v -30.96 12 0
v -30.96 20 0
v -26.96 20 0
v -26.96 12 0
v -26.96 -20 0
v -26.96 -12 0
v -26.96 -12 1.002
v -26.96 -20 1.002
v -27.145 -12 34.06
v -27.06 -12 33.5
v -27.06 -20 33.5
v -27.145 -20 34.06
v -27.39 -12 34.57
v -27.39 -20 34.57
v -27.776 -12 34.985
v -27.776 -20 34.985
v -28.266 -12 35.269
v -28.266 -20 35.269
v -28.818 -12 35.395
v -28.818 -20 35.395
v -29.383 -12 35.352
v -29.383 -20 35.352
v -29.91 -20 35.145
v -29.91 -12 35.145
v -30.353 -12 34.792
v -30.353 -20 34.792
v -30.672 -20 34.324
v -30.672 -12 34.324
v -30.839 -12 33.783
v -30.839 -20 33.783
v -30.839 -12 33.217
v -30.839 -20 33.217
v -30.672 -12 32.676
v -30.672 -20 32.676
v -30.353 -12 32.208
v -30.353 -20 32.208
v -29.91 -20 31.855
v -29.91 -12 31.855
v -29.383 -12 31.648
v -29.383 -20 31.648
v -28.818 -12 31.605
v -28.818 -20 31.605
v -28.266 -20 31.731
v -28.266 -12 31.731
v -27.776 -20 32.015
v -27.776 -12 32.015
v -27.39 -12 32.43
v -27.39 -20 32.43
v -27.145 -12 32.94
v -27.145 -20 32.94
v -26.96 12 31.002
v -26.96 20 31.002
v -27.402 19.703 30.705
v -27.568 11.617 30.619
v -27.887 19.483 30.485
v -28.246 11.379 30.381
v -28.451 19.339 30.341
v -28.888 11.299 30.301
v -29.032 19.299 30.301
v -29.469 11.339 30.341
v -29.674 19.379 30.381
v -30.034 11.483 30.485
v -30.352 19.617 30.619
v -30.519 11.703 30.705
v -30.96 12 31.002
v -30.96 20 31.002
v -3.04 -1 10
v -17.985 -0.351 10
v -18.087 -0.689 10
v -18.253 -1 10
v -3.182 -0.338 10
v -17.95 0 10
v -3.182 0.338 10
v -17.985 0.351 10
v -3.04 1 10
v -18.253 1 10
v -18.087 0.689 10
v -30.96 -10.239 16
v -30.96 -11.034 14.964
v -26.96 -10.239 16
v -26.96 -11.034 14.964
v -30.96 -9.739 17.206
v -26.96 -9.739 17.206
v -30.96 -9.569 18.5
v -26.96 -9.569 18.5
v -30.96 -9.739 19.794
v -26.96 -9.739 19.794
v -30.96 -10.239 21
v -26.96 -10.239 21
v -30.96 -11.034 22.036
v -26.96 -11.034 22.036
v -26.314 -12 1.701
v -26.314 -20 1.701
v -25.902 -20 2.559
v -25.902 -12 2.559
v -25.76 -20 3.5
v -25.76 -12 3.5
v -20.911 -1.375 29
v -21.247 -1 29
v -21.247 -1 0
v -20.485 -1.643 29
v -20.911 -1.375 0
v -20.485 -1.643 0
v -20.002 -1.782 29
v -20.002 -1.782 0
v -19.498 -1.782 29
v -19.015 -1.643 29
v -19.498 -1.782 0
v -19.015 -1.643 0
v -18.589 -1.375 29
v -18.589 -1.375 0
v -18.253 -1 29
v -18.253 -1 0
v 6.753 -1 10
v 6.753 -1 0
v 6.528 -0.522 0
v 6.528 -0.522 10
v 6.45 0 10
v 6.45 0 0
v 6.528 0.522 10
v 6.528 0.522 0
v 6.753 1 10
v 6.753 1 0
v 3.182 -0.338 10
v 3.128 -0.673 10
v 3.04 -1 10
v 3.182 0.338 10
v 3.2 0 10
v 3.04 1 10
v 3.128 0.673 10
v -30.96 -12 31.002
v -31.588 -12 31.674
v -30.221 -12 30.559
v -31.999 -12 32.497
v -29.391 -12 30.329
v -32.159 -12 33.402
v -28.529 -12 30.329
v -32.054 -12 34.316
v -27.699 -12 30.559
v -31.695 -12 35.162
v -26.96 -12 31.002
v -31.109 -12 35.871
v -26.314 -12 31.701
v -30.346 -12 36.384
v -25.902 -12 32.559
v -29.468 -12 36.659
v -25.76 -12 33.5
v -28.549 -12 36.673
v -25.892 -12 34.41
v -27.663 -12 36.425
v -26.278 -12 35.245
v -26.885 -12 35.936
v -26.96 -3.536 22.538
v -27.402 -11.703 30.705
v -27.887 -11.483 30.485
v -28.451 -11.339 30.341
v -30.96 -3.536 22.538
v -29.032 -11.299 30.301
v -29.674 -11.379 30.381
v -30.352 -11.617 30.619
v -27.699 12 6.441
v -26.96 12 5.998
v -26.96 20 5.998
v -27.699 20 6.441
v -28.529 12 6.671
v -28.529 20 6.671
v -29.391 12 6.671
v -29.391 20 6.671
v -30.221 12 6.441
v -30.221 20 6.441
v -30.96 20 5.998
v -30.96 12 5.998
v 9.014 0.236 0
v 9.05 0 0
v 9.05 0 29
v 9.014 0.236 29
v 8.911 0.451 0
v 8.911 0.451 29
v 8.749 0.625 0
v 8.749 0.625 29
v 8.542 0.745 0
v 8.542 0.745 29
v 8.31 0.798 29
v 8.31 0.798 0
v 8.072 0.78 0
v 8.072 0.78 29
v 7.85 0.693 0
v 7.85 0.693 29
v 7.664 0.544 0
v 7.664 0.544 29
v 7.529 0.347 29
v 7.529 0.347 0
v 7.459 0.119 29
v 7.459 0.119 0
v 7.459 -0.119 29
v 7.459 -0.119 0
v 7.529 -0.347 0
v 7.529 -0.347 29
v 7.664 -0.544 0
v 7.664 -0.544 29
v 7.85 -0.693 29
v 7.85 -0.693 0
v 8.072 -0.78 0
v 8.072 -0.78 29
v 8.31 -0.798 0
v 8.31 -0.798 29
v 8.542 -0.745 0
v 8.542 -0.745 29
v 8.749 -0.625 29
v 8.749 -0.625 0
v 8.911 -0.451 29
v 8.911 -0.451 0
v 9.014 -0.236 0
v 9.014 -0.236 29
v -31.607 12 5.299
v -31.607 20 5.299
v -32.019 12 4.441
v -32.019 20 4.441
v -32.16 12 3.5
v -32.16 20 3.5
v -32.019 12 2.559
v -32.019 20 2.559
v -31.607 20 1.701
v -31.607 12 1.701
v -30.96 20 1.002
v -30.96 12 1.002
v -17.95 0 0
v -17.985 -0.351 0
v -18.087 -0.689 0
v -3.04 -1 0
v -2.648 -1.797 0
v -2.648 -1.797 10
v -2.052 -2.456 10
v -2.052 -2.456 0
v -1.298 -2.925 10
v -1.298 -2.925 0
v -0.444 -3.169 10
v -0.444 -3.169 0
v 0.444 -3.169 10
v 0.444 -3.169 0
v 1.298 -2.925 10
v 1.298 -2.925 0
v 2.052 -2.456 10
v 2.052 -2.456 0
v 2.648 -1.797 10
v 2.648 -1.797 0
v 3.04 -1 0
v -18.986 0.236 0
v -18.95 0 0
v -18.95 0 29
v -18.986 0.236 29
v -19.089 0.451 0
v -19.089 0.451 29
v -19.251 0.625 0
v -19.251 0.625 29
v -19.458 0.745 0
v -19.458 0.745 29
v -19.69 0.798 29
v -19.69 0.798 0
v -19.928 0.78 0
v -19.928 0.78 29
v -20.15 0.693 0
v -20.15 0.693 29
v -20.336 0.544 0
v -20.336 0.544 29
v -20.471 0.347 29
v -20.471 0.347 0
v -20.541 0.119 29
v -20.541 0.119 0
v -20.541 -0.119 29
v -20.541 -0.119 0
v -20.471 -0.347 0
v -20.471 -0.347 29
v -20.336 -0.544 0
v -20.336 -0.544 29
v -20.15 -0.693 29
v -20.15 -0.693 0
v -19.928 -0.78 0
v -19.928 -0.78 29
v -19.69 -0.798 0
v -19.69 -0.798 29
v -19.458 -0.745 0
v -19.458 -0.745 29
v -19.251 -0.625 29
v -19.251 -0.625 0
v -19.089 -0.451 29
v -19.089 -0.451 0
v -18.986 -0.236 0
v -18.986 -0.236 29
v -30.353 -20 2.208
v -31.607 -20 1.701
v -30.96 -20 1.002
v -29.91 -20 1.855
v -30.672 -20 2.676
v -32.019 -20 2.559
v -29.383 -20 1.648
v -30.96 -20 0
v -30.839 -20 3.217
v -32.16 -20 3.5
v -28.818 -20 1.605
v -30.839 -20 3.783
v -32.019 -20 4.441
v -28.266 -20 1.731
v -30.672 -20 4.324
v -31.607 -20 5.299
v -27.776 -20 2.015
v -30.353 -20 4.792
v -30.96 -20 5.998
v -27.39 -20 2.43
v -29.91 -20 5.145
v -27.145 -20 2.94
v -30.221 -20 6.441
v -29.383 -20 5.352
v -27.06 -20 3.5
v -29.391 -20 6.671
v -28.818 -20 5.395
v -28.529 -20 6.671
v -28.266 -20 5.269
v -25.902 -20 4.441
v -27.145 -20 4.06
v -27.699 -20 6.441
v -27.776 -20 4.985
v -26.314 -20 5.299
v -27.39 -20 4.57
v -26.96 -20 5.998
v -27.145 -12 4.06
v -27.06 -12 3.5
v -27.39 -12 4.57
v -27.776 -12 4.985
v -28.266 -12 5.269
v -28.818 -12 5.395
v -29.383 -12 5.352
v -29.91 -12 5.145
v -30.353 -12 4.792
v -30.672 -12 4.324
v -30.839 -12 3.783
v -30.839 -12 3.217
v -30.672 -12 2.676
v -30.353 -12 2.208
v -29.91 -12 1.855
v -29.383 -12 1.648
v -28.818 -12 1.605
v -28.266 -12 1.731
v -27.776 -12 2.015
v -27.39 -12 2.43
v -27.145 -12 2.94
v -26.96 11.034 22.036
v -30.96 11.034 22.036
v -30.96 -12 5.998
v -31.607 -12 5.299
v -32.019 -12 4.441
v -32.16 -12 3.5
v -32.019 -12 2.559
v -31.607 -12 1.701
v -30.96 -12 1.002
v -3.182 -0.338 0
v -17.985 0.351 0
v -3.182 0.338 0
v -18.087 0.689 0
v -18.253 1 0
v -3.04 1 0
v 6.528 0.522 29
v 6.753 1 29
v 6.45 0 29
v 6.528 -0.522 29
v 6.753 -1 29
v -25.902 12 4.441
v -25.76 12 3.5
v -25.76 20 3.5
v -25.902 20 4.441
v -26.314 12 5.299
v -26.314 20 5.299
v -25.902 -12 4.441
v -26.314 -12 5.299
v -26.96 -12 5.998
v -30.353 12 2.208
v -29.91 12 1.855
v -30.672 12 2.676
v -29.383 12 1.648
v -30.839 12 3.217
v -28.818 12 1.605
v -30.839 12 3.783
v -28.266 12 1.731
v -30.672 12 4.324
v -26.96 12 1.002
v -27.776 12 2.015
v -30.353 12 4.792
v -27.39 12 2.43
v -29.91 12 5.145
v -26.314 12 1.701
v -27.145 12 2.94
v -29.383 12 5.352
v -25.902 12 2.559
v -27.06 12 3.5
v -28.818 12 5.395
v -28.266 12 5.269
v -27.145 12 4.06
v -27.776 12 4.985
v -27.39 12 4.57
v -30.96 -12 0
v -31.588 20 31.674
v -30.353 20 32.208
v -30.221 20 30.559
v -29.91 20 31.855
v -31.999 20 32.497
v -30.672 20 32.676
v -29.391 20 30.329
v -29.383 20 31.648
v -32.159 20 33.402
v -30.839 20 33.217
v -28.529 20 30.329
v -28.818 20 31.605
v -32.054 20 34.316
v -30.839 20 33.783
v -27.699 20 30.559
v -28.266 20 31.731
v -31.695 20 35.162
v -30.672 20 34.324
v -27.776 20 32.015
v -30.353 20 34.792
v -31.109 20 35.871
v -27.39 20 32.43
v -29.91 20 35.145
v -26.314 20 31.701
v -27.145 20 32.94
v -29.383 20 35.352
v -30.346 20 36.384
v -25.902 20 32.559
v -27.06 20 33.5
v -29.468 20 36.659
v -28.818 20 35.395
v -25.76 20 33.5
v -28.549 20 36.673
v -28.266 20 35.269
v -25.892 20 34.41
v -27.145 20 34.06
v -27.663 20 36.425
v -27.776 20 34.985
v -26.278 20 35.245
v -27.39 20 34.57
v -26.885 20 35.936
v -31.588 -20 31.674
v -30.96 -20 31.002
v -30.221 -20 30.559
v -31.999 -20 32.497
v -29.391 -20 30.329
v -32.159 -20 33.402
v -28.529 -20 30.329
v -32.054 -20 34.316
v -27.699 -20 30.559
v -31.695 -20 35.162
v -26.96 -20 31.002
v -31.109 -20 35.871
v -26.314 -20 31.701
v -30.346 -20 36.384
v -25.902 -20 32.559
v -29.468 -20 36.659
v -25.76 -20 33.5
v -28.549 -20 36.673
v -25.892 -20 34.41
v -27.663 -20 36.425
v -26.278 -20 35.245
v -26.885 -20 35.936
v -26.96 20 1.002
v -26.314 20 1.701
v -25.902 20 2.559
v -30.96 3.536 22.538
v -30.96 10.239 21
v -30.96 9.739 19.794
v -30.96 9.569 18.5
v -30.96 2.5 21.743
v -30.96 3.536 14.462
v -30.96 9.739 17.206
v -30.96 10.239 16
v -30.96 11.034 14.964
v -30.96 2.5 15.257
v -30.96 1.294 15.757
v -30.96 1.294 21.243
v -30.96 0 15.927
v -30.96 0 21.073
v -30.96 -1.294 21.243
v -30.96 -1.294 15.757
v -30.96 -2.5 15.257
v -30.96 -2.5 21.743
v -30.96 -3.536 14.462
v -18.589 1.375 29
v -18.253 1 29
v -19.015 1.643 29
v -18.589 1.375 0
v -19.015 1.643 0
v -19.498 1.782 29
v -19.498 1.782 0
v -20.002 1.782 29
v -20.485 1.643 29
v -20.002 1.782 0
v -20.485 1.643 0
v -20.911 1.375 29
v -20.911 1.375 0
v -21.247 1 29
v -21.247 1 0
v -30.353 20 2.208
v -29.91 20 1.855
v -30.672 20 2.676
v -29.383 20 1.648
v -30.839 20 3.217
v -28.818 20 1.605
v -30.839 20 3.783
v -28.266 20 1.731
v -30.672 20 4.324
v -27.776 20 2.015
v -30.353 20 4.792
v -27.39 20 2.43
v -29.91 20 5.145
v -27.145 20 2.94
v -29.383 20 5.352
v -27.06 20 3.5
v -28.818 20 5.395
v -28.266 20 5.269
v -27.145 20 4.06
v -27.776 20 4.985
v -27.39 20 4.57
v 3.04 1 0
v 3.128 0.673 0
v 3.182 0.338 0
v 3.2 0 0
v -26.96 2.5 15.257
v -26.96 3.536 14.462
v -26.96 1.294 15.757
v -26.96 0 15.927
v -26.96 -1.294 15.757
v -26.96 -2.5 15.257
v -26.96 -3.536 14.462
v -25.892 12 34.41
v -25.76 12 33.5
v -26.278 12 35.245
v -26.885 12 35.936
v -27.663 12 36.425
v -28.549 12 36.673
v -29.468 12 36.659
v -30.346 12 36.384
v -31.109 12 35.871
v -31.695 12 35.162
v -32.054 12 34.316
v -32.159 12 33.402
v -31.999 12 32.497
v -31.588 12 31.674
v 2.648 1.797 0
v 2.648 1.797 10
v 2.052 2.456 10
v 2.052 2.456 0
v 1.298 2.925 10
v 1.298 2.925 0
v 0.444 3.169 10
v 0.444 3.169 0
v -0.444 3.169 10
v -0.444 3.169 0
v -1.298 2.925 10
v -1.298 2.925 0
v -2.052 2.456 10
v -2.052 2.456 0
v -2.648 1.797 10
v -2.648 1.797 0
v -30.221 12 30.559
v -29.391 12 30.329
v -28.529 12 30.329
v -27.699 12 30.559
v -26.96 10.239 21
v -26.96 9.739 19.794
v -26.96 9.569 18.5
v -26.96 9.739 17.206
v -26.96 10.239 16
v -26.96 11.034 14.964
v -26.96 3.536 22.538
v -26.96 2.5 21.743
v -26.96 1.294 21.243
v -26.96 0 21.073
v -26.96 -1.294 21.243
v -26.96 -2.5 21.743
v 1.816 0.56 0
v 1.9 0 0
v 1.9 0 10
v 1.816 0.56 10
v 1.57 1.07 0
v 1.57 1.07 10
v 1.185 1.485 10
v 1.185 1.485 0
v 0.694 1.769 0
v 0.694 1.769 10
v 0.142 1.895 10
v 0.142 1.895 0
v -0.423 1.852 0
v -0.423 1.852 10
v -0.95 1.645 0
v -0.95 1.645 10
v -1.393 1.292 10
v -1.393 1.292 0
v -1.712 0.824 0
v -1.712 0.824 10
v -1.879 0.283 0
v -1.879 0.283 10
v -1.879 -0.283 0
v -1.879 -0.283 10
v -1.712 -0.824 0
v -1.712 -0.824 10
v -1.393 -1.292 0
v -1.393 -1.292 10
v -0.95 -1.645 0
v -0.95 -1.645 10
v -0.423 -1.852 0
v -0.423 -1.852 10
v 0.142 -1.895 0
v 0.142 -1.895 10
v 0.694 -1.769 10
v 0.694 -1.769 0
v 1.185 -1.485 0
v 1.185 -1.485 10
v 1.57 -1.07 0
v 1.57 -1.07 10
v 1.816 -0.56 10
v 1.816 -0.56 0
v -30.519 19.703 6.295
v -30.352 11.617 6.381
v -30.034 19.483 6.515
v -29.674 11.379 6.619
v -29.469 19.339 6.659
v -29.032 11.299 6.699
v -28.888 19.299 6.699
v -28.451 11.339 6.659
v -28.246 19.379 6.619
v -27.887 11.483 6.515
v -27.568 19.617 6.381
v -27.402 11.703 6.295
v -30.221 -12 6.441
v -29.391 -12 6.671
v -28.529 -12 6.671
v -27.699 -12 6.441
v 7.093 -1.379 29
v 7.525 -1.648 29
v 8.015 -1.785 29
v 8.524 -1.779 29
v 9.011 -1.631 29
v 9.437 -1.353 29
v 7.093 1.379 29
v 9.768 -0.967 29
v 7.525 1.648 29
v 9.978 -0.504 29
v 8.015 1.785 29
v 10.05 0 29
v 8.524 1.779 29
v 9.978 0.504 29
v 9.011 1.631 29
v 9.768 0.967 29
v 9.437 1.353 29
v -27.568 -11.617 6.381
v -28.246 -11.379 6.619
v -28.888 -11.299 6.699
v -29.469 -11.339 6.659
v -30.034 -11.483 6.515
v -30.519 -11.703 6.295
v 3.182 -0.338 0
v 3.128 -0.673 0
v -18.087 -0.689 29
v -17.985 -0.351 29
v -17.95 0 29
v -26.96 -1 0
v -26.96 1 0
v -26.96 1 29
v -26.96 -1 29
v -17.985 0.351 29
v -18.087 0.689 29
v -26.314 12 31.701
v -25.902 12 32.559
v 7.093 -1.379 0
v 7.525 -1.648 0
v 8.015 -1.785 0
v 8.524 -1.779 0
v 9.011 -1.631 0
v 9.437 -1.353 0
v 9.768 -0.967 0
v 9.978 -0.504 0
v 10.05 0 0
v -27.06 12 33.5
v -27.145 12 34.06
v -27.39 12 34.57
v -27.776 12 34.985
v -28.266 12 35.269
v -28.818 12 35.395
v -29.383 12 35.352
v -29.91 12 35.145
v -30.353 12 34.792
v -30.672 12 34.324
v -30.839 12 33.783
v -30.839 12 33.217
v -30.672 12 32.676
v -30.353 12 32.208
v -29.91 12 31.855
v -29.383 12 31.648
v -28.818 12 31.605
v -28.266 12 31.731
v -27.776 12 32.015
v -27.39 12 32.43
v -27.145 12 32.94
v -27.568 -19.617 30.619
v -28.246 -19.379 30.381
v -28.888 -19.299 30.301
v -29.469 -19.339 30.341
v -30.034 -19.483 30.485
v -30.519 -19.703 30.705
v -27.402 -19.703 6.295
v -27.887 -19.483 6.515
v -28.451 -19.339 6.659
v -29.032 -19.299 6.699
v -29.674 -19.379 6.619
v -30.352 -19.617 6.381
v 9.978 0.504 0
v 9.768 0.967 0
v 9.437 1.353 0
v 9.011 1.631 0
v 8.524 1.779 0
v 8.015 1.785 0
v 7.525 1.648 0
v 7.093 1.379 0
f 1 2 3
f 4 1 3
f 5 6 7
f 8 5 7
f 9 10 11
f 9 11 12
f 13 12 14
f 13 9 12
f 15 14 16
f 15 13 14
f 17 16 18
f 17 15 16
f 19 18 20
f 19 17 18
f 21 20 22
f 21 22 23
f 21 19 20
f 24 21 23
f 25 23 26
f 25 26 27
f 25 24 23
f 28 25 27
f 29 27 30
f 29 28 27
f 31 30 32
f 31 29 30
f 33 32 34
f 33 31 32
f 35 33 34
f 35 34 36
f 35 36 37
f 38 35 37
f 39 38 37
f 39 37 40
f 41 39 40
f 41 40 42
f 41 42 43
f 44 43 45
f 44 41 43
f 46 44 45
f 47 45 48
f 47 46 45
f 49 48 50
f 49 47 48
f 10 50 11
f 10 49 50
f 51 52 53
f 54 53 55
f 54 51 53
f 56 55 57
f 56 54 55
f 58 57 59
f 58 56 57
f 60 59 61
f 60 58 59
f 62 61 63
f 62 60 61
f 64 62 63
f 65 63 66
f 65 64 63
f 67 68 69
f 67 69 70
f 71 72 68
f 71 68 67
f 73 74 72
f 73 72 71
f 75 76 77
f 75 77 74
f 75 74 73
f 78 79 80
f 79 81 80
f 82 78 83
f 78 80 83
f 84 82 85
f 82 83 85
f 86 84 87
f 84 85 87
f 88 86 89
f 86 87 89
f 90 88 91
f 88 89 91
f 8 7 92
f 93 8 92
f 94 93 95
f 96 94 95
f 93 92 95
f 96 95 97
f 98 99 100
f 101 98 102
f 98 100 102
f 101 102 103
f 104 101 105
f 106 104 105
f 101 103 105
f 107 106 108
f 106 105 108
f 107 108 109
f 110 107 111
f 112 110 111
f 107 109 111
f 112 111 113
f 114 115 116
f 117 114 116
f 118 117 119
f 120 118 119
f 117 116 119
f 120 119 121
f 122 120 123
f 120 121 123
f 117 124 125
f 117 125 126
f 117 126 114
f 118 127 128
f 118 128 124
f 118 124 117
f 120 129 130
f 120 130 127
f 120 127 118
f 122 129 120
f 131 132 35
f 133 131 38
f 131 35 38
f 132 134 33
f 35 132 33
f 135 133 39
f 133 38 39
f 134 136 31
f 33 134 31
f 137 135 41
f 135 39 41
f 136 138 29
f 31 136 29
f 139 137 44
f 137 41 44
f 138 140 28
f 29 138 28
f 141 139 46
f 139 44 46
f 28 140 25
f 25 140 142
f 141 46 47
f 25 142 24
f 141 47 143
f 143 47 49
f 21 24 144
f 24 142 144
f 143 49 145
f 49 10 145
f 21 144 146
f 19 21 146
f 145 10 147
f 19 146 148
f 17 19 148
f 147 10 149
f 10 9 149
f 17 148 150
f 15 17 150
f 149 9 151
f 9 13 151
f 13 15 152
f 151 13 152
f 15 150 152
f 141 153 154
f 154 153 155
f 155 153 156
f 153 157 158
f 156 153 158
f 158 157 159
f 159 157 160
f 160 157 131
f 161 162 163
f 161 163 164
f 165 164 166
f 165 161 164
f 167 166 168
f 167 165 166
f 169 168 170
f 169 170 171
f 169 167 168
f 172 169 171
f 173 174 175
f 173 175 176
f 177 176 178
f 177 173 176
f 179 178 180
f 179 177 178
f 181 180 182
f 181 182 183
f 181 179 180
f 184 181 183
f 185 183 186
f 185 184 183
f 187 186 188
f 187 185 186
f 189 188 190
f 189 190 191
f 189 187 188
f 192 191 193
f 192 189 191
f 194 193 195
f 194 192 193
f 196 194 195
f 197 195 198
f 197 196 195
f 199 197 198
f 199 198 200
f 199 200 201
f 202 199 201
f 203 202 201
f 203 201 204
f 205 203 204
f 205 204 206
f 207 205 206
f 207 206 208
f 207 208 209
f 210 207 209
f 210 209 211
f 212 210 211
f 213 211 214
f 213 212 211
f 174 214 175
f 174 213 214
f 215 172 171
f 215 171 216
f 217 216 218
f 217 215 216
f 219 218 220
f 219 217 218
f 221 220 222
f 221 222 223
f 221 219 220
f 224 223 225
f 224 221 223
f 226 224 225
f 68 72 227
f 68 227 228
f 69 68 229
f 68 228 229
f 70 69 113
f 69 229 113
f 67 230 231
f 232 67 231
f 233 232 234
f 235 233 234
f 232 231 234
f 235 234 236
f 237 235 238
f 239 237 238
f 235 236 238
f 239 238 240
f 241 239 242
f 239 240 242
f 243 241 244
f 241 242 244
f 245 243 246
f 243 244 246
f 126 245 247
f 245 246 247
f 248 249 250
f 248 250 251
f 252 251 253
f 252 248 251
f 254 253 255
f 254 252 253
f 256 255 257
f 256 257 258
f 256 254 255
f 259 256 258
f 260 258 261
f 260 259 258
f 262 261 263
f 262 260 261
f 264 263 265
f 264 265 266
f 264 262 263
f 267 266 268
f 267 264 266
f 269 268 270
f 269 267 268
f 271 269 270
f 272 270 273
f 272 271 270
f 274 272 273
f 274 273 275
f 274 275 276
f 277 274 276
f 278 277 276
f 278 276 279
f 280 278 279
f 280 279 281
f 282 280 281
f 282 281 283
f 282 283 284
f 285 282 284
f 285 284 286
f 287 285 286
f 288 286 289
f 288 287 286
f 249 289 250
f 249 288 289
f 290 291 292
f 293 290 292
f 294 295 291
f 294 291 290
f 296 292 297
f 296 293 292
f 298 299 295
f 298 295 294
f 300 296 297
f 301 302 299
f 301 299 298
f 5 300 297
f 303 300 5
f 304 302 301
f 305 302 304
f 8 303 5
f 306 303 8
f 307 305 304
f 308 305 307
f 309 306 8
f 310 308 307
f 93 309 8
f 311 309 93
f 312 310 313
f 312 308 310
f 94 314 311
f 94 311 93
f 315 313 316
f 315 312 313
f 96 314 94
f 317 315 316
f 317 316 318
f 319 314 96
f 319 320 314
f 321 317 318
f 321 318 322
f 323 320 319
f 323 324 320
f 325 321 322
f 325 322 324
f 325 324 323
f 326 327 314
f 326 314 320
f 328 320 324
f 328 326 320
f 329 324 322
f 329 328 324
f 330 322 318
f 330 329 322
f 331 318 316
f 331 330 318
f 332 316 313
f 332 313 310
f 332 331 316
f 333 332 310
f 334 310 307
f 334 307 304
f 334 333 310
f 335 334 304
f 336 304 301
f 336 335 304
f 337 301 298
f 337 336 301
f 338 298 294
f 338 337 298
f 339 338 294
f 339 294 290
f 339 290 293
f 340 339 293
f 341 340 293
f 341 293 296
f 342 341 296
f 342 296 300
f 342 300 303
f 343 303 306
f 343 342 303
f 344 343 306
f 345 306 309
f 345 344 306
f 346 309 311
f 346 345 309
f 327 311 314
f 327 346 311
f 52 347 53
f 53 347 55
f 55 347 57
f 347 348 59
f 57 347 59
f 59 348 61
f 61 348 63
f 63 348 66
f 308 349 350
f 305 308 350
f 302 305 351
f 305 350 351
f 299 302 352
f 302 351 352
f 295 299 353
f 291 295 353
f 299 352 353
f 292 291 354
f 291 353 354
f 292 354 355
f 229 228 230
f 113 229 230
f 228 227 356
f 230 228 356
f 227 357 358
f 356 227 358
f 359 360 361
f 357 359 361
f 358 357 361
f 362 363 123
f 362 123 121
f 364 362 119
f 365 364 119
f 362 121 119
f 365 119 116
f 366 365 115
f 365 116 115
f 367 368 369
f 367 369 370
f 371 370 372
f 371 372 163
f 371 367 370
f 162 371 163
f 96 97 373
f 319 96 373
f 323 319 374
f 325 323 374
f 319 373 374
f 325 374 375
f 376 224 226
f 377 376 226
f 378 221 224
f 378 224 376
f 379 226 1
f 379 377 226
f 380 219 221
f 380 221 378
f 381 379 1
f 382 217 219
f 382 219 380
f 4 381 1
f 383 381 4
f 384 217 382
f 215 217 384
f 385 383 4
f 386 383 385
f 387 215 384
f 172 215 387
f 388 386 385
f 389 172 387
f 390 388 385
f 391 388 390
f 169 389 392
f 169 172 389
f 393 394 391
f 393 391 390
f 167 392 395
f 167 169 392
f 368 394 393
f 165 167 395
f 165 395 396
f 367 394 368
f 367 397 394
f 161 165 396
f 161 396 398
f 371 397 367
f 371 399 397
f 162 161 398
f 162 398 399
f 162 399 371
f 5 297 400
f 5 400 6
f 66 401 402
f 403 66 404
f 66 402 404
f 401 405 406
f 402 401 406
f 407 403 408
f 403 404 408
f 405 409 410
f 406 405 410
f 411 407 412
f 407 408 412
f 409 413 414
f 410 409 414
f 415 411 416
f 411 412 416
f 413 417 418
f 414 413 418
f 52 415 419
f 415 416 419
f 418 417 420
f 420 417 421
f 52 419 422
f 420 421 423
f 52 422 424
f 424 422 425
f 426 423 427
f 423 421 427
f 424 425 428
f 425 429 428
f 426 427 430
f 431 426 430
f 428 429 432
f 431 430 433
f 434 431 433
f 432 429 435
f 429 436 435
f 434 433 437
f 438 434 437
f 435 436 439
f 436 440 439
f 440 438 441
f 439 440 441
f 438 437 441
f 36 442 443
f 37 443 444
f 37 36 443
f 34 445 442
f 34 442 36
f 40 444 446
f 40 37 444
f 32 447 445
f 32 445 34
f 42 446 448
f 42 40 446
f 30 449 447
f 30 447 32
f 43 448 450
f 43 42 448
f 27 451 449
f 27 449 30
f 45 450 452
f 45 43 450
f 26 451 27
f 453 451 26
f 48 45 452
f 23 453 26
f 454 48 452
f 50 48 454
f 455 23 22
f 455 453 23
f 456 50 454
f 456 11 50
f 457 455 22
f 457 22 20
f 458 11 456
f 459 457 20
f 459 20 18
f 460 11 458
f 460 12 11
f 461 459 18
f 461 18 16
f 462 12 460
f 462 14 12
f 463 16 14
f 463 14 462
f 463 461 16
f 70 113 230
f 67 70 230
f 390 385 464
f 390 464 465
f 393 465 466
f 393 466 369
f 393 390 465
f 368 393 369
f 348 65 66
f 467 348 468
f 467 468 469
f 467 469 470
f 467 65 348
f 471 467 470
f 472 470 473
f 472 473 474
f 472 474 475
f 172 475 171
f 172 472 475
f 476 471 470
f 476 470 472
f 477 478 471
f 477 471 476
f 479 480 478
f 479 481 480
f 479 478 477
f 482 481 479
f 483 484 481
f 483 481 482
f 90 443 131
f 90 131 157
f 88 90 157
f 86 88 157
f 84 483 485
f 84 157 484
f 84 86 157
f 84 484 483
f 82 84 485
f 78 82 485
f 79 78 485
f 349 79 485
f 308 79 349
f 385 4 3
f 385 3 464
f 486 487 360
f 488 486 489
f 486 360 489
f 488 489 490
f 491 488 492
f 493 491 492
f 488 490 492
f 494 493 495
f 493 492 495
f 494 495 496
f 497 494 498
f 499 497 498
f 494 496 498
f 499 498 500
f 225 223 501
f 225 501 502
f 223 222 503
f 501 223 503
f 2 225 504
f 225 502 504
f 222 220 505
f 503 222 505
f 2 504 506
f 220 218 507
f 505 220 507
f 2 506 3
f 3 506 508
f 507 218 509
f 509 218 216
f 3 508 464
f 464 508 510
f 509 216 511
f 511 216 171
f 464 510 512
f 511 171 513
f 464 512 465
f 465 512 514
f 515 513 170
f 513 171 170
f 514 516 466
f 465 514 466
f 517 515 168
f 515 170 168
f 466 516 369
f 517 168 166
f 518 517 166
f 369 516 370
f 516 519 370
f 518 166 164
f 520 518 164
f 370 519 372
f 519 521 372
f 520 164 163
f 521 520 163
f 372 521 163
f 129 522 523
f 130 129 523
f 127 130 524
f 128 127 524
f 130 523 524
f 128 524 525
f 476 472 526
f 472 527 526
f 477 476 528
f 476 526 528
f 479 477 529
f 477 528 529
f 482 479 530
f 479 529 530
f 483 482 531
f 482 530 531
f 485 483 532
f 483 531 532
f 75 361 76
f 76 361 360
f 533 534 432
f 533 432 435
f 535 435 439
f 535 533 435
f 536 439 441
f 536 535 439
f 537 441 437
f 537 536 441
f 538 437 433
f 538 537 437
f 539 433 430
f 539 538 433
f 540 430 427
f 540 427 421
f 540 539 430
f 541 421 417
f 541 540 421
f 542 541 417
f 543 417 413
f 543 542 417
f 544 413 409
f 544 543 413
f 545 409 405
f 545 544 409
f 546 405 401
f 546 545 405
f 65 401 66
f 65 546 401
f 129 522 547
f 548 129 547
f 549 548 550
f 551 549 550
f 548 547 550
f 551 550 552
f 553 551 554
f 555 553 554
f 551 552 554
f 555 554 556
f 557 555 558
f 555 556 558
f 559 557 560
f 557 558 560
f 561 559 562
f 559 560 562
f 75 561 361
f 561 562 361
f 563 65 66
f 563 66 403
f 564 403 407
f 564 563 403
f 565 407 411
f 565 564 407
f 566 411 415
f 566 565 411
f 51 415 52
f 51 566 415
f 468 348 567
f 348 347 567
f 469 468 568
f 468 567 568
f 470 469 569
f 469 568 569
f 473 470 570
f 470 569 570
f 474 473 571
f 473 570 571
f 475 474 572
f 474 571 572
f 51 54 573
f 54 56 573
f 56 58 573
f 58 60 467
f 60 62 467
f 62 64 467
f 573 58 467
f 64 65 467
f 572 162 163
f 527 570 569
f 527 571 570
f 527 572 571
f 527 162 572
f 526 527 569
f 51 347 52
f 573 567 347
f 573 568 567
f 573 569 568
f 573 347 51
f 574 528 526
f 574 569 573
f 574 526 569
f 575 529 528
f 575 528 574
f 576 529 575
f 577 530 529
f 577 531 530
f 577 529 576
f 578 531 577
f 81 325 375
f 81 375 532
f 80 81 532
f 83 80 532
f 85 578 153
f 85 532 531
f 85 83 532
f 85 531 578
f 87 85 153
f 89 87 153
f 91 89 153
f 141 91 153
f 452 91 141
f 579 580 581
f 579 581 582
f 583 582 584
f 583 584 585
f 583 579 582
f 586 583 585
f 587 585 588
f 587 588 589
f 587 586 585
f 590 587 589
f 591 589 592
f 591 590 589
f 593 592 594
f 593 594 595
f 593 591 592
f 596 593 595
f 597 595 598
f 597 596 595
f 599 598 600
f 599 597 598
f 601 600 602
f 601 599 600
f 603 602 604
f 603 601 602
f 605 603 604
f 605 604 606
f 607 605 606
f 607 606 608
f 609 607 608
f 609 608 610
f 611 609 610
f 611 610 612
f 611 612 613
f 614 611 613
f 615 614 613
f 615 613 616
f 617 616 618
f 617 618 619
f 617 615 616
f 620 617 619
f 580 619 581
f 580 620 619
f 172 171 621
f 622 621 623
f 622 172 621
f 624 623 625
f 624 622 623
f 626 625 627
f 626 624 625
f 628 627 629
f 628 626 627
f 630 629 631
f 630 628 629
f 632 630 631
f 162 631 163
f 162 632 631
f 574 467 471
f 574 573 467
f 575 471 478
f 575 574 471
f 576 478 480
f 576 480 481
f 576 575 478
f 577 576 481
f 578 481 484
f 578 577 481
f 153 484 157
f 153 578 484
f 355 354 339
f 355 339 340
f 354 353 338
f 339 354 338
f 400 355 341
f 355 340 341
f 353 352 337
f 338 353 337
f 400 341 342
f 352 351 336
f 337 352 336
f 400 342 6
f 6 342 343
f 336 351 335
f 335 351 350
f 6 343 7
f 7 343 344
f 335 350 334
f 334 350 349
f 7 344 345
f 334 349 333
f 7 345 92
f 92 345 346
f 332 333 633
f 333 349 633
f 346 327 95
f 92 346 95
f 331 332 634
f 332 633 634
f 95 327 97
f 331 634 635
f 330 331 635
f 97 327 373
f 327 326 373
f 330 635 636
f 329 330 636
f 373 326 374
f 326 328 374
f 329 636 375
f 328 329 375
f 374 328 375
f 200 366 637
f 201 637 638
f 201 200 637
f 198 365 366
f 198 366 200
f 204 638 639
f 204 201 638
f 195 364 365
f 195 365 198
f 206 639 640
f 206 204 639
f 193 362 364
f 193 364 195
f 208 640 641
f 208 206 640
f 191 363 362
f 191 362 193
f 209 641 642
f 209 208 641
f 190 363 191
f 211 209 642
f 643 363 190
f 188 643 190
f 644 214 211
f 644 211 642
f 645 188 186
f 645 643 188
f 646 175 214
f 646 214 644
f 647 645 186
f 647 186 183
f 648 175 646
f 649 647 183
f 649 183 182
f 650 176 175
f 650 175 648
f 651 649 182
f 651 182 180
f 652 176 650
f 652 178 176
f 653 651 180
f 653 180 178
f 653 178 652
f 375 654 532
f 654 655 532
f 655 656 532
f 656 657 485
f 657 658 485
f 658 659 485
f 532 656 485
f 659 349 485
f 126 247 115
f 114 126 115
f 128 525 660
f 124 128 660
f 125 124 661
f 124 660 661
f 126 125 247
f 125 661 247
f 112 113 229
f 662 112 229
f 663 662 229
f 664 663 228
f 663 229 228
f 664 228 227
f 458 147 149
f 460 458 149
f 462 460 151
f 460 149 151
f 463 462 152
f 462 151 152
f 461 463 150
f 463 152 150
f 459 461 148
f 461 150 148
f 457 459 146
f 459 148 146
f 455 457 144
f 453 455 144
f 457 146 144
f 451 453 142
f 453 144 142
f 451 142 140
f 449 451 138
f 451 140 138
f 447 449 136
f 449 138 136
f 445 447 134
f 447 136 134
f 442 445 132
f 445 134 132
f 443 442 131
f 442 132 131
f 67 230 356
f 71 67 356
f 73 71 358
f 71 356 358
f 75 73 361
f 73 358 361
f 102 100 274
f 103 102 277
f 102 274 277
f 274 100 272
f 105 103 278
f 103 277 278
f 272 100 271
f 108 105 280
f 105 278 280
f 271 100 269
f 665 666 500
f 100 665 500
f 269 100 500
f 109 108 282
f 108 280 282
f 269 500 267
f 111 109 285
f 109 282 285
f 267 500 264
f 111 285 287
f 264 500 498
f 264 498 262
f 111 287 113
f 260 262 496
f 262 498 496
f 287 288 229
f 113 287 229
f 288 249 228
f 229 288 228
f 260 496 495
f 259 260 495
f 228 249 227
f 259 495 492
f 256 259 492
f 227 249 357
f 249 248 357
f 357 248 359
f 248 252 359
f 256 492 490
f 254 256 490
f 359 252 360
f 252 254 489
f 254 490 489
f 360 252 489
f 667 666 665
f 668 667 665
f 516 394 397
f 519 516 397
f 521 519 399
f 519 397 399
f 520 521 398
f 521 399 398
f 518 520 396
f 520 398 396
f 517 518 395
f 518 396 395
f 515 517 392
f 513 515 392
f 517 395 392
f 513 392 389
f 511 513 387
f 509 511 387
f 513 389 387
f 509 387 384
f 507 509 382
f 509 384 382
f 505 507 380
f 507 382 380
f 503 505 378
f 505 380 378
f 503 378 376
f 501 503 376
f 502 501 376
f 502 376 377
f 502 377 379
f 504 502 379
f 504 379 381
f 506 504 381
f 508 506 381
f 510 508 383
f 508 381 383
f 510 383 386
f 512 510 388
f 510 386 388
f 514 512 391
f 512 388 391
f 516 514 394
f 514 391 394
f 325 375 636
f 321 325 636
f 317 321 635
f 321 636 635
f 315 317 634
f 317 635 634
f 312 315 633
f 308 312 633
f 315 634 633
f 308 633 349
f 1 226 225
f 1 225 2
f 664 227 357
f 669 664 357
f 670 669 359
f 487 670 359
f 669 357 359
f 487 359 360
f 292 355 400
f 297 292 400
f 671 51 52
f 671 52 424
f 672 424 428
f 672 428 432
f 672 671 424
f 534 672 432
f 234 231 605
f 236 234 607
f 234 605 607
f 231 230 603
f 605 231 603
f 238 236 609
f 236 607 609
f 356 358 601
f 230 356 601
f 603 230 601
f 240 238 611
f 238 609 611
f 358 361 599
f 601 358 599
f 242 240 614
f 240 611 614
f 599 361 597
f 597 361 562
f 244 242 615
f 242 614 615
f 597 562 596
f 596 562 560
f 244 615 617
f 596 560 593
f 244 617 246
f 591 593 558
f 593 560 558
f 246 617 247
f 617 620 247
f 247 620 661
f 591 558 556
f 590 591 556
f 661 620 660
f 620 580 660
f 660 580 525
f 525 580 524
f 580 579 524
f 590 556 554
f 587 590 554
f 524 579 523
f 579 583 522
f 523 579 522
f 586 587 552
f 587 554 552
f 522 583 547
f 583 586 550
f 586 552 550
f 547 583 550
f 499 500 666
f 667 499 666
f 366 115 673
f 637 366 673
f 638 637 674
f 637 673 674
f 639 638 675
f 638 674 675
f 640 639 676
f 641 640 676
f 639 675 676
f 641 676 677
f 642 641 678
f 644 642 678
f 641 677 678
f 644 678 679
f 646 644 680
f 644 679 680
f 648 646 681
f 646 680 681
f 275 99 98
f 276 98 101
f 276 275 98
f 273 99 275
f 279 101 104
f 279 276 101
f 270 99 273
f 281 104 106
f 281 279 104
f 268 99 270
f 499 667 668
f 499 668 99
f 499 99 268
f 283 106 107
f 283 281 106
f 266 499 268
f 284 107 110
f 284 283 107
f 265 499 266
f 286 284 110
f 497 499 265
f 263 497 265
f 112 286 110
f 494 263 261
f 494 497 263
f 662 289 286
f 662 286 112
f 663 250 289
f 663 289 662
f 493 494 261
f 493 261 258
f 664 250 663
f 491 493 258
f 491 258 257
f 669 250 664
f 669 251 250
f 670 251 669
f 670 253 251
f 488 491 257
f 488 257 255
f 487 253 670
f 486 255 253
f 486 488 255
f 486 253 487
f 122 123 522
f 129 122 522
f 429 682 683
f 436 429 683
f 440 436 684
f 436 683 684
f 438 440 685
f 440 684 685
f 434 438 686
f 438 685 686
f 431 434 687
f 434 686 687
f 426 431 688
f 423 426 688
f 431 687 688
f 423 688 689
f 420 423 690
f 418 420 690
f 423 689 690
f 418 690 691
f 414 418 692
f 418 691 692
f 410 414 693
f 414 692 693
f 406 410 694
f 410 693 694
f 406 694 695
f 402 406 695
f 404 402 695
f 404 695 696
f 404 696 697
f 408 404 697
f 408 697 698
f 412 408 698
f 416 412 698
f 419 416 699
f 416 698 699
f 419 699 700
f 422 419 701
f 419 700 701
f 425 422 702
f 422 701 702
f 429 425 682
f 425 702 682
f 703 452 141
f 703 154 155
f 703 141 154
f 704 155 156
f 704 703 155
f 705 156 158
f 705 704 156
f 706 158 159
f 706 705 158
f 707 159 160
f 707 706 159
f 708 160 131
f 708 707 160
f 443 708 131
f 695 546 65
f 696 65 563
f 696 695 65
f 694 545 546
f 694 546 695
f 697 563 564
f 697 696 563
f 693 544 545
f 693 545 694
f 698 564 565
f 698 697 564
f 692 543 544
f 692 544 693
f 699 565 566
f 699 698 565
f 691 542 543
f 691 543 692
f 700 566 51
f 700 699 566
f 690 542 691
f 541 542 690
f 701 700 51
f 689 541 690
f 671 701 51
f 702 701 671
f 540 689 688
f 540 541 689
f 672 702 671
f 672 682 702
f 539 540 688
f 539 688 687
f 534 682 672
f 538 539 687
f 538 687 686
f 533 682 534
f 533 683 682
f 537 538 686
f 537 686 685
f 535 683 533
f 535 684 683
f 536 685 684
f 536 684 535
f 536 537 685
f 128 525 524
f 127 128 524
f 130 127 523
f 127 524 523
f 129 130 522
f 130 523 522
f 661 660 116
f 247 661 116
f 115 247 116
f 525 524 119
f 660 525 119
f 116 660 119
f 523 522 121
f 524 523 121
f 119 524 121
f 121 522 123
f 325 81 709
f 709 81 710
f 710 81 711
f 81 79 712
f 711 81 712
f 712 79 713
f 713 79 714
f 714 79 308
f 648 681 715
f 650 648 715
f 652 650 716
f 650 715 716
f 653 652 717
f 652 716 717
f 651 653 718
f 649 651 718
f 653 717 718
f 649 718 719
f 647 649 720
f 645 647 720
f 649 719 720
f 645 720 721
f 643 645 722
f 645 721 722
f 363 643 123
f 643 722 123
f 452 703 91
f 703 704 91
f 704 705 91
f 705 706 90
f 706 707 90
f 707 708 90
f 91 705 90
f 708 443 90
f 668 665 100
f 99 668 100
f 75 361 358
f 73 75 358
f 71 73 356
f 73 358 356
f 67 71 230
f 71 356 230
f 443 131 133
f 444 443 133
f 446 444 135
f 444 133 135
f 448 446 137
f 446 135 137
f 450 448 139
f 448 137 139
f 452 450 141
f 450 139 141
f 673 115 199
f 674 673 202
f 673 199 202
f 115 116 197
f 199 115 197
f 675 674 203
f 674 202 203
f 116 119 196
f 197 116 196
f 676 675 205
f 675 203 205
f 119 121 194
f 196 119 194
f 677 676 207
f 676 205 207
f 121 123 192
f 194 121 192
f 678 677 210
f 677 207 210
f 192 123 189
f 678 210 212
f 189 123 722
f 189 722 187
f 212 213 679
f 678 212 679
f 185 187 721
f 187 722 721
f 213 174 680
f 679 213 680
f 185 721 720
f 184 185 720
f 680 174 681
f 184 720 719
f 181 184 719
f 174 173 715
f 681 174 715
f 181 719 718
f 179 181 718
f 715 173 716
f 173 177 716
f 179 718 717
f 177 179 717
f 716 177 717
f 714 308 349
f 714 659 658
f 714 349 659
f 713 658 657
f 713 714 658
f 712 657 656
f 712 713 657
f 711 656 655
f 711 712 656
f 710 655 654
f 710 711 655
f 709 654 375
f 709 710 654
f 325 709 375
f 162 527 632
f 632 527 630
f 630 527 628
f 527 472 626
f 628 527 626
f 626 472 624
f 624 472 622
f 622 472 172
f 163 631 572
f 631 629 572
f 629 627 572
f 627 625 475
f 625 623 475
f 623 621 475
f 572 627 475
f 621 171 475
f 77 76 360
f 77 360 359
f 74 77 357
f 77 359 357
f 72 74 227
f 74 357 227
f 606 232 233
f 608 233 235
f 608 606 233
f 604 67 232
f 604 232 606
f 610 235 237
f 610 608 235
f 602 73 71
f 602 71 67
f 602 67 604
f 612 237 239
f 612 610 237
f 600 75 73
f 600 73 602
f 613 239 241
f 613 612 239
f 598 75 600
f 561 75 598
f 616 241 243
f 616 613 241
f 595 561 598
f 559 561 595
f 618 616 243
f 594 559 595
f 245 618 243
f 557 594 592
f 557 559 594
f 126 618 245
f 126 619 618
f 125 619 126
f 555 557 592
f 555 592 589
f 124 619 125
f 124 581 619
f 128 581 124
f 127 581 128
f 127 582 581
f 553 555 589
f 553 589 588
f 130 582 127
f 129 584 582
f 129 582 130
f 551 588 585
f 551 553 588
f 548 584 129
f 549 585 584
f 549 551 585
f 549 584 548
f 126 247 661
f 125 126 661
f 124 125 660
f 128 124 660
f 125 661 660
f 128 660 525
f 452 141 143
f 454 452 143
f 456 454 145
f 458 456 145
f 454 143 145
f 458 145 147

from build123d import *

# Parameters (mm, degrees)
F0_R     = 0.8
F1_DEPTH = 29
F2_DEPTH = 10
F0_R_2   = 1.9
F3_DEPTH = 10
F5_START = 12
F4_R     = 1.9
F5_DEPTH = 8
F6_START = -12
F6_DEPTH = 8
F7_DEPTH = 20
F9_DEPTH = 4
F10_R    = 5


with BuildPart() as f1:
    # F0 (on Top) → F1 (new body)
    with BuildSketch(Plane.XY):
        with BuildLine():
            ThreePointArc((-17.95, 0), (-18.027502784, 0.522497216), (-18.2533370453, 1))
            ThreePointArc((-18.2533370453, 1), (-19.75, 1.8), (-21.2466629547, 1))
            ThreePointArc((-21.2466629547, 1), (-21.55, 0), (-21.2466629547, -1))
            ThreePointArc((-21.2466629547, -1), (-19.75, -1.8), (-18.2533370453, -1))
            ThreePointArc((-18.2533370453, -1), (-18.027502784, -0.522497216), (-17.95, 0))
        make_face()
        with Locations((-19.75, 0)):
            Circle(F0_R, mode=Mode.SUBTRACT)
        with BuildLine():
            ThreePointArc((-21.2466629547, -1), (-21.55, 0), (-21.2466629547, 1))
            Line((-21.2466629547, 1), (-26.9602631693, 1))
            Line((-26.9602631693, 1), (-26.9602631693, -1))
            Line((-26.9602631693, -1), (-21.2466629547, -1))
        make_face()
    extrude(amount=F1_DEPTH)


with BuildPart() as f1b:
    # F0 (on Top) → F1, piece 2 (new body)
    with BuildSketch(Plane.XY):
        with BuildLine():
            ThreePointArc((10.05, 0), (8.772497216, 1.722497216), (6.7533370453, 1))
            ThreePointArc((6.7533370453, 1), (6.45, 0), (6.7533370453, -1))
            ThreePointArc((6.7533370453, -1), (8.772497216, -1.722497216), (10.05, 0))
        make_face()
        with Locations((8.25, 0)):
            Circle(F0_R, mode=Mode.SUBTRACT)
    extrude(amount=F1_DEPTH)


with BuildPart() as f2:
    # F0 (on Top) → F2 (new body)
    with BuildSketch(Plane.XY):
        with BuildLine():
            ThreePointArc((-3.0397368307, -1), (-3.2, 0), (-3.0397368307, 1))
            Line((-3.0397368307, 1), (-18.2533370453, 1))
            ThreePointArc((-18.2533370453, 1), (-18.027502784, 0.522497216), (-17.95, 0))
            ThreePointArc((-17.95, 0), (-18.027502784, -0.522497216), (-18.2533370453, -1))
            Line((-18.2533370453, -1), (-3.0397368307, -1))
        make_face()
    extrude(amount=F2_DEPTH)


with BuildPart() as f2b:
    # F0 (on Top) → F2, piece 2 (new body)
    with BuildSketch(Plane.XY):
        with BuildLine():
            ThreePointArc((3.0397368307, 1), (3.1596801941, 0.5063803618), (3.2, 0))
            ThreePointArc((3.2, 0), (3.1596801941, -0.5063803618), (3.0397368307, -1))
            Line((3.0397368307, -1), (6.7533370453, -1))
            ThreePointArc((6.7533370453, -1), (6.45, 0), (6.7533370453, 1))
            Line((6.7533370453, 1), (3.0397368307, 1))
        make_face()
    extrude(amount=F2_DEPTH)


with BuildPart() as f3:
    # F0 (on Top) → F3 (new body)
    with BuildSketch(Plane.XY):
        with BuildLine():
            ThreePointArc((3.0397368307, -1), (3.1596801941, -0.5063803618), (3.2, 0))
            ThreePointArc((3.2, 0), (3.1596801941, 0.5063803618), (3.0397368307, 1))
            ThreePointArc((3.0397368307, 1), (0, 3.2), (-3.0397368307, 1))
            ThreePointArc((-3.0397368307, 1), (-3.2, 0), (-3.0397368307, -1))
            ThreePointArc((-3.0397368307, -1), (0, -3.2), (3.0397368307, -1))
        make_face()
        Circle(F0_R_2, mode=Mode.SUBTRACT)
    extrude(amount=F3_DEPTH)


with BuildPart() as f5:
    # F4 (on Front) → F5 (new body)
    with BuildSketch(Plane.XZ.offset(F5_START)):
        with BuildLine():
            ThreePointArc((-26.9602631693, 31.0020008006), (-26.0758221489, 32.1143593539), (-25.7602631693, 33.5))
            ThreePointArc((-25.7602631693, 33.5), (-30.3459038153, 36.3844410204), (-30.9602631693, 31.0020008006))
            ThreePointArc((-30.9602631693, 31.0020008006), (-28.9602631693, 30.3), (-26.9602631693, 31.0020008006))
        make_face()
        with Locations((-28.9602631693, 33.5)):
            Circle(F4_R, mode=Mode.SUBTRACT)
    extrude(amount=F5_DEPTH)


with BuildPart() as f5b:
    # F4 (on Front) → F5, piece 2 (new body)
    with BuildSketch(Plane.XZ.offset(F5_START)):
        with BuildLine():
            ThreePointArc((-26.9602631693, 5.9979991994), (-28.9602631693, 6.7), (-30.9602631693, 5.9979991994))
            ThreePointArc((-30.9602631693, 5.9979991994), (-32.1602631693, 3.5), (-30.9602631693, 1.0020008006))
            ThreePointArc((-30.9602631693, 1.0020008006), (-28.9602631693, 0.3), (-26.9602631693, 1.0020008006))
            ThreePointArc((-26.9602631693, 1.0020008006), (-26.0758221489, 2.1143593539), (-25.7602631693, 3.5))
            ThreePointArc((-25.7602631693, 3.5), (-26.0758221489, 4.8856406461), (-26.9602631693, 5.9979991994))
        make_face()
        with Locations((-28.9602631693, 3.5)):
            Circle(F4_R, mode=Mode.SUBTRACT)
        with BuildLine():
            ThreePointArc((-26.9602631693, 1.0020008006), (-28.9602631693, 0.3), (-30.9602631693, 1.0020008006))
            Line((-30.9602631693, 1.0020008006), (-30.9602631693, 0))
            Line((-30.9602631693, 0), (-26.9602631693, 0))
            Line((-26.9602631693, 0), (-26.9602631693, 1.0020008006))
        make_face()
    extrude(amount=F5_DEPTH)


with BuildPart() as f6:
    # F4 (on Front) → F6 (new body)
    with BuildSketch(Plane.XZ.offset(F6_START)):
        with BuildLine():
            ThreePointArc((-26.9602631693, 31.0020008006), (-26.0758221489, 32.1143593539), (-25.7602631693, 33.5))
            ThreePointArc((-25.7602631693, 33.5), (-30.3459038153, 36.3844410204), (-30.9602631693, 31.0020008006))
            ThreePointArc((-30.9602631693, 31.0020008006), (-28.9602631693, 30.3), (-26.9602631693, 31.0020008006))
        make_face()
        with Locations((-28.9602631693, 33.5)):
            Circle(F4_R, mode=Mode.SUBTRACT)
    extrude(amount=-F6_DEPTH)


with BuildPart() as f6b:
    # F4 (on Front) → F6, piece 2 (new body)
    with BuildSketch(Plane.XZ.offset(F6_START)):
        with BuildLine():
            ThreePointArc((-26.9602631693, 5.9979991994), (-28.9602631693, 6.7), (-30.9602631693, 5.9979991994))
            ThreePointArc((-30.9602631693, 5.9979991994), (-32.1602631693, 3.5), (-30.9602631693, 1.0020008006))
            ThreePointArc((-30.9602631693, 1.0020008006), (-28.9602631693, 0.3), (-26.9602631693, 1.0020008006))
            ThreePointArc((-26.9602631693, 1.0020008006), (-26.0758221489, 2.1143593539), (-25.7602631693, 3.5))
            ThreePointArc((-25.7602631693, 3.5), (-26.0758221489, 4.8856406461), (-26.9602631693, 5.9979991994))
        make_face()
        with Locations((-28.9602631693, 3.5)):
            Circle(F4_R, mode=Mode.SUBTRACT)
        with BuildLine():
            ThreePointArc((-26.9602631693, 1.0020008006), (-28.9602631693, 0.3), (-30.9602631693, 1.0020008006))
            Line((-30.9602631693, 1.0020008006), (-30.9602631693, 0))
            Line((-30.9602631693, 0), (-26.9602631693, 0))
            Line((-26.9602631693, 0), (-26.9602631693, 1.0020008006))
        make_face()
    extrude(amount=-F6_DEPTH)


with BuildPart() as f7:
    # F4 (on Front) → F7 (new body, symmetric)
    with BuildSketch(Plane.XZ):
        with BuildLine():
            ThreePointArc((-26.9602631693, 31.0020008006), (-28.9602631693, 30.3), (-30.9602631693, 31.0020008006))
            Line((-30.9602631693, 31.0020008006), (-30.9602631693, 5.9979991994))
            ThreePointArc((-30.9602631693, 5.9979991994), (-28.9602631693, 6.7), (-26.9602631693, 5.9979991994))
            Line((-26.9602631693, 5.9979991994), (-26.9602631693, 31.0020008006))
        make_face()
    extrude(amount=F7_DEPTH, both=True)

    # F8 (on face) → F9 (cut, through all)
    with BuildSketch(Plane(origin=(-30.9602631693, 0, 0), x_dir=(0, -1, 0), z_dir=(-1, 0, 0))):
        Polygon((-7.4979991994, 18.5), (-20, 31.0020008006), (-20, 5.9979991994), align=None)
        Polygon((12, 31.0020008006), (-12, 31.0020008006), (0, 19.0020008006), align=None)
        Polygon((20, 5.9979991994), (20, 31.0020008006), (7.4979991994, 18.5), align=None)
        Polygon((0, 17.9979991994), (-12, 5.9979991994), (12, 5.9979991994), align=None)
    extrude(amount=-F9_DEPTH, mode=Mode.SUBTRACT)

    # F10
    f10_edges = [f7.edges().sort_by_distance(p)[0] for p in [
        (-28.960263, 7.497999, 18.5),
        (-28.960263, -7.497999, 18.5),
        (-28.960263, 0, 19.002001),
        (-28.960263, 0, 17.997999),
    ]]
    fillet(f10_edges, radius=F10_R)


solid = Compound([f1.part, f1b.part, f2.part, f2b.part, f3.part, f5.part, f5b.part, f6.part, f6b.part, f7.part])
